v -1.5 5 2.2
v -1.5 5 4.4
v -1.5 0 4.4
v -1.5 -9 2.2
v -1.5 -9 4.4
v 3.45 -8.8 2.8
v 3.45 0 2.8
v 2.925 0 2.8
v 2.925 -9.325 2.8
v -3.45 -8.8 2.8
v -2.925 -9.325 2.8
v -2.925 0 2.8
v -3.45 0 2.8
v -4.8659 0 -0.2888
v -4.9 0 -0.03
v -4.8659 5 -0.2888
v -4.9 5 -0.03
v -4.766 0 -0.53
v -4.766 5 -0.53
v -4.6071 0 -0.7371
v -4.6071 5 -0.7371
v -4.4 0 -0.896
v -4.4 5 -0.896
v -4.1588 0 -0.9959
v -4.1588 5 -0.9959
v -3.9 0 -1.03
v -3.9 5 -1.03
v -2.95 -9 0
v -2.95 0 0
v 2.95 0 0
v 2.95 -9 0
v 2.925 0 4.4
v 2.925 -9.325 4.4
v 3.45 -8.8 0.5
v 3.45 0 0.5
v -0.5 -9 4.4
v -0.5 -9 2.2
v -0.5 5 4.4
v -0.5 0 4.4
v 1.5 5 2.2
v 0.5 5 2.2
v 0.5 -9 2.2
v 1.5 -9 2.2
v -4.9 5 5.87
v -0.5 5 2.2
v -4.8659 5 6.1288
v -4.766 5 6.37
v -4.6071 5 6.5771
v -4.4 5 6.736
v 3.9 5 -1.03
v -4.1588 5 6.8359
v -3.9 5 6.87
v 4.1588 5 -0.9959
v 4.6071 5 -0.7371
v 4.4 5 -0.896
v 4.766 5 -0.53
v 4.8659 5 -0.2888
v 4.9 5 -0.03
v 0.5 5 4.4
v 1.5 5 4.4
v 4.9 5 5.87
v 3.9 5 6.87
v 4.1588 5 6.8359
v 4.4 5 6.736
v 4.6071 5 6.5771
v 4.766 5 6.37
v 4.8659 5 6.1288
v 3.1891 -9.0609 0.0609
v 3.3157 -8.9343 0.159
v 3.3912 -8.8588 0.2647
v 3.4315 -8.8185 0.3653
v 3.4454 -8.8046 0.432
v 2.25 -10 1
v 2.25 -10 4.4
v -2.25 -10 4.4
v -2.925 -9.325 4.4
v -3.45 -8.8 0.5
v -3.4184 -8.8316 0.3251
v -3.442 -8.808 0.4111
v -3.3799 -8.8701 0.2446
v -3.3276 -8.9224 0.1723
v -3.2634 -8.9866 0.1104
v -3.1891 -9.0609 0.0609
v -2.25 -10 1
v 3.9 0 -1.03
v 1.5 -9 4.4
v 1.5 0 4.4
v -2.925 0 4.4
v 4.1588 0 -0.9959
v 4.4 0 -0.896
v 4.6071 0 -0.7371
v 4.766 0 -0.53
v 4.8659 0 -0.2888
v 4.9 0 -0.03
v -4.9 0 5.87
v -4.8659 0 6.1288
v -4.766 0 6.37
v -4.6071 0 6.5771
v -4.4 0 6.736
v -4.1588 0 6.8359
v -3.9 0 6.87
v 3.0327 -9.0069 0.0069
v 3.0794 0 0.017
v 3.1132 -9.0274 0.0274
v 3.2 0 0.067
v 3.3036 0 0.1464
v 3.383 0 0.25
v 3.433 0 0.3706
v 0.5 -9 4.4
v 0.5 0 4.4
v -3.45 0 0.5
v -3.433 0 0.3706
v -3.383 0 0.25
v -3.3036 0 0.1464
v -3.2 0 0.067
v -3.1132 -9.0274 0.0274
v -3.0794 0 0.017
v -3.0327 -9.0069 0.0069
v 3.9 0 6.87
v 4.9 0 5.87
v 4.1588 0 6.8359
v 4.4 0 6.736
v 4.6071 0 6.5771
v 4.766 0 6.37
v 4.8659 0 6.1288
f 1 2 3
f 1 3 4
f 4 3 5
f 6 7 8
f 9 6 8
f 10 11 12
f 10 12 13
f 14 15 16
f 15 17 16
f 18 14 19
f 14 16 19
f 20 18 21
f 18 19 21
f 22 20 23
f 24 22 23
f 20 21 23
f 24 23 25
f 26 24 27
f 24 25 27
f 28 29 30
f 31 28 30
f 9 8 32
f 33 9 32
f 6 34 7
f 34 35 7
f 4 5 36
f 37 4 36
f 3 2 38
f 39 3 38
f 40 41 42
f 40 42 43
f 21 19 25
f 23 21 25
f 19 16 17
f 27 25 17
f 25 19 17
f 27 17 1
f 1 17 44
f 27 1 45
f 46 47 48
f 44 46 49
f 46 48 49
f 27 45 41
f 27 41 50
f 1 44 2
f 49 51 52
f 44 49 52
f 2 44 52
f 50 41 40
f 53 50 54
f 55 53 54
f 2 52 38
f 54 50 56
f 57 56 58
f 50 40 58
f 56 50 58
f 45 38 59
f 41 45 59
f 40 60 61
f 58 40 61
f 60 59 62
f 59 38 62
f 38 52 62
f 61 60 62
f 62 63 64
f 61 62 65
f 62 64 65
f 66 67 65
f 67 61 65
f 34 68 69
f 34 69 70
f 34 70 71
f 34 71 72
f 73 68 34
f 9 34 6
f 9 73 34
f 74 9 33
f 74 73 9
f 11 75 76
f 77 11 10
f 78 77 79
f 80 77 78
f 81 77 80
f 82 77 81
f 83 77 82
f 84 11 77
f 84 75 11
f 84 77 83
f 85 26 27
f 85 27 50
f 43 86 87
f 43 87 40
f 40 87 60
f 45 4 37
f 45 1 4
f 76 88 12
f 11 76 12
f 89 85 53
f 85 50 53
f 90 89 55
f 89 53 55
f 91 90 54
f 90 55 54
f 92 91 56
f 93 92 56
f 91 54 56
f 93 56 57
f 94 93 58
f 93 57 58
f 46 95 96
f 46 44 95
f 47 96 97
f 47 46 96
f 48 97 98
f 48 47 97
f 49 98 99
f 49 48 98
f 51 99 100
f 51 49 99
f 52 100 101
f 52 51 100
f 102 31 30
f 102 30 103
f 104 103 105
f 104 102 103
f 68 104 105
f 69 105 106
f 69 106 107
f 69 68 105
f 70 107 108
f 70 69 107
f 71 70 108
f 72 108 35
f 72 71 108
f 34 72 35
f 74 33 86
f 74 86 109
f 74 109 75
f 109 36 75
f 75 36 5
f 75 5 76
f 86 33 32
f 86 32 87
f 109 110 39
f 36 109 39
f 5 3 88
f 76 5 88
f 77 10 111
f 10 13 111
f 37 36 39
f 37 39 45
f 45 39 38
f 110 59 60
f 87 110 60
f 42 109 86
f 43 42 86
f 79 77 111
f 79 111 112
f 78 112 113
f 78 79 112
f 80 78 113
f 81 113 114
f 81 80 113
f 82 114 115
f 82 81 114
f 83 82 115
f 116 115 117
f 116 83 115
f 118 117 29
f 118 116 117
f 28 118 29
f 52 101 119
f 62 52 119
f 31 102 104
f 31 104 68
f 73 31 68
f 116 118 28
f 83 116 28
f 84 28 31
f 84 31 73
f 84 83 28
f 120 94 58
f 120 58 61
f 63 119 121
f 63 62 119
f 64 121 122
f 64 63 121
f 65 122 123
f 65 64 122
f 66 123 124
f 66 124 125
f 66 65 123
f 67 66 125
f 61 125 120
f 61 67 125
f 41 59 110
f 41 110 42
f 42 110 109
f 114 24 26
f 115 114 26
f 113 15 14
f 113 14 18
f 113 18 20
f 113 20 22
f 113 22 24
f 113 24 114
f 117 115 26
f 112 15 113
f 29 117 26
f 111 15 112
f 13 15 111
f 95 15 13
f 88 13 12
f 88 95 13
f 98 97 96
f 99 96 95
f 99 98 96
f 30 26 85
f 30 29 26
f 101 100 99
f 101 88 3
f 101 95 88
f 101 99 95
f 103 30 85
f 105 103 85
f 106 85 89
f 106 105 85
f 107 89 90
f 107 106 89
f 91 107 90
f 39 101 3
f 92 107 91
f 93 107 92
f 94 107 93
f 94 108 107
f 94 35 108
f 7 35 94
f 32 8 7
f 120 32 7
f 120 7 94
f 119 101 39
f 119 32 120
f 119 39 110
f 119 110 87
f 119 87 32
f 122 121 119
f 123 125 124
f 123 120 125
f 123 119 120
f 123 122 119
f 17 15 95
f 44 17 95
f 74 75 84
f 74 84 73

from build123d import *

# Parameters (mm, degrees)
F1_DEPTH    = 10
F2_SIZE     = 1.2
F3_R        = 0.5
F5_W        = 9.8
F5_H        = 7.9
F6_DEPTH    = 5
F8_DEPTH    = 2.2
F9_T1_DEPTH = 9.6433659759
F10_R       = 1


# Not quite as in the source:
# - a fillet or chamfer that OpenCascade refuses, or shapes differently, is made with other operations: its cross-section is extruded or revolved along the edge and cut away or added


with BuildPart() as f1:
    # F0 (on Front) → F1 (new body)
    with BuildSketch(Plane.XZ):
        Polygon((-3.45, 2.8), (-3.45, 0), (3.45, 0), (3.45, 2.8), (2.925, 2.8), (2.925, 4.4), (-2.925, 4.4), (-2.925, 2.8), align=None)
    extrude(amount=F1_DEPTH)

    # F2
    f2_edges = [f1.edges().sort_by_distance(p)[0] for p in [
        (3.45, -10, 1.4),
        (-3.45, -10, 1.4),
    ]]
    chamfer(f2_edges, length=F2_SIZE)

    # F3
    f3_edges = [f1.edges().sort_by_distance(p)[0] for p in [
        (-3.45, -4.4, 0),
        (3.45, -4.4, 0),
    ]]
    fillet(f3_edges, radius=F3_R)

    # F5 (on Front) → F6 (join)
    with BuildSketch(Plane.XZ):
        with Locations((0, 2.92)):
            Rectangle(F5_W, F5_H)
    extrude(amount=-F6_DEPTH)

    # F7 (on offset) → F8 (cut)
    with BuildSketch(Plane.XY.offset(4.4)):
        Polygon((-1.5, 0), (-1.5, -9), (-0.5, -9), (-0.5, 5), (-1.5, 5), align=None)
        Polygon((1.5, 5), (0.5, 5), (0.5, -9), (1.5, -9), (1.5, 0), align=None)
    extrude(amount=-F8_DEPTH, mode=Mode.SUBTRACT)

    # F9: chamfer of 1 on 1 edges, made by hand

    # F9_s2 → F9_t1 (cut)
    with BuildSketch(Plane.YZ.offset(-4.821682988)):
        Polygon((-9, 0), (-10, 1), (-10, 0), align=None)
    extrude(amount=F9_T1_DEPTH, mode=Mode.SUBTRACT)

    # F10
    f10_edges = [f1.edges().sort_by_distance(p)[0] for p in [
        (4.9, 2.5, 6.87),
        (4.9, 2.5, -1.03),
        (-4.9, 2.5, -1.03),
        (-4.9, 2.5, 6.87),
    ]]
    fillet(f10_edges, radius=F10_R)


solid = f1.part
